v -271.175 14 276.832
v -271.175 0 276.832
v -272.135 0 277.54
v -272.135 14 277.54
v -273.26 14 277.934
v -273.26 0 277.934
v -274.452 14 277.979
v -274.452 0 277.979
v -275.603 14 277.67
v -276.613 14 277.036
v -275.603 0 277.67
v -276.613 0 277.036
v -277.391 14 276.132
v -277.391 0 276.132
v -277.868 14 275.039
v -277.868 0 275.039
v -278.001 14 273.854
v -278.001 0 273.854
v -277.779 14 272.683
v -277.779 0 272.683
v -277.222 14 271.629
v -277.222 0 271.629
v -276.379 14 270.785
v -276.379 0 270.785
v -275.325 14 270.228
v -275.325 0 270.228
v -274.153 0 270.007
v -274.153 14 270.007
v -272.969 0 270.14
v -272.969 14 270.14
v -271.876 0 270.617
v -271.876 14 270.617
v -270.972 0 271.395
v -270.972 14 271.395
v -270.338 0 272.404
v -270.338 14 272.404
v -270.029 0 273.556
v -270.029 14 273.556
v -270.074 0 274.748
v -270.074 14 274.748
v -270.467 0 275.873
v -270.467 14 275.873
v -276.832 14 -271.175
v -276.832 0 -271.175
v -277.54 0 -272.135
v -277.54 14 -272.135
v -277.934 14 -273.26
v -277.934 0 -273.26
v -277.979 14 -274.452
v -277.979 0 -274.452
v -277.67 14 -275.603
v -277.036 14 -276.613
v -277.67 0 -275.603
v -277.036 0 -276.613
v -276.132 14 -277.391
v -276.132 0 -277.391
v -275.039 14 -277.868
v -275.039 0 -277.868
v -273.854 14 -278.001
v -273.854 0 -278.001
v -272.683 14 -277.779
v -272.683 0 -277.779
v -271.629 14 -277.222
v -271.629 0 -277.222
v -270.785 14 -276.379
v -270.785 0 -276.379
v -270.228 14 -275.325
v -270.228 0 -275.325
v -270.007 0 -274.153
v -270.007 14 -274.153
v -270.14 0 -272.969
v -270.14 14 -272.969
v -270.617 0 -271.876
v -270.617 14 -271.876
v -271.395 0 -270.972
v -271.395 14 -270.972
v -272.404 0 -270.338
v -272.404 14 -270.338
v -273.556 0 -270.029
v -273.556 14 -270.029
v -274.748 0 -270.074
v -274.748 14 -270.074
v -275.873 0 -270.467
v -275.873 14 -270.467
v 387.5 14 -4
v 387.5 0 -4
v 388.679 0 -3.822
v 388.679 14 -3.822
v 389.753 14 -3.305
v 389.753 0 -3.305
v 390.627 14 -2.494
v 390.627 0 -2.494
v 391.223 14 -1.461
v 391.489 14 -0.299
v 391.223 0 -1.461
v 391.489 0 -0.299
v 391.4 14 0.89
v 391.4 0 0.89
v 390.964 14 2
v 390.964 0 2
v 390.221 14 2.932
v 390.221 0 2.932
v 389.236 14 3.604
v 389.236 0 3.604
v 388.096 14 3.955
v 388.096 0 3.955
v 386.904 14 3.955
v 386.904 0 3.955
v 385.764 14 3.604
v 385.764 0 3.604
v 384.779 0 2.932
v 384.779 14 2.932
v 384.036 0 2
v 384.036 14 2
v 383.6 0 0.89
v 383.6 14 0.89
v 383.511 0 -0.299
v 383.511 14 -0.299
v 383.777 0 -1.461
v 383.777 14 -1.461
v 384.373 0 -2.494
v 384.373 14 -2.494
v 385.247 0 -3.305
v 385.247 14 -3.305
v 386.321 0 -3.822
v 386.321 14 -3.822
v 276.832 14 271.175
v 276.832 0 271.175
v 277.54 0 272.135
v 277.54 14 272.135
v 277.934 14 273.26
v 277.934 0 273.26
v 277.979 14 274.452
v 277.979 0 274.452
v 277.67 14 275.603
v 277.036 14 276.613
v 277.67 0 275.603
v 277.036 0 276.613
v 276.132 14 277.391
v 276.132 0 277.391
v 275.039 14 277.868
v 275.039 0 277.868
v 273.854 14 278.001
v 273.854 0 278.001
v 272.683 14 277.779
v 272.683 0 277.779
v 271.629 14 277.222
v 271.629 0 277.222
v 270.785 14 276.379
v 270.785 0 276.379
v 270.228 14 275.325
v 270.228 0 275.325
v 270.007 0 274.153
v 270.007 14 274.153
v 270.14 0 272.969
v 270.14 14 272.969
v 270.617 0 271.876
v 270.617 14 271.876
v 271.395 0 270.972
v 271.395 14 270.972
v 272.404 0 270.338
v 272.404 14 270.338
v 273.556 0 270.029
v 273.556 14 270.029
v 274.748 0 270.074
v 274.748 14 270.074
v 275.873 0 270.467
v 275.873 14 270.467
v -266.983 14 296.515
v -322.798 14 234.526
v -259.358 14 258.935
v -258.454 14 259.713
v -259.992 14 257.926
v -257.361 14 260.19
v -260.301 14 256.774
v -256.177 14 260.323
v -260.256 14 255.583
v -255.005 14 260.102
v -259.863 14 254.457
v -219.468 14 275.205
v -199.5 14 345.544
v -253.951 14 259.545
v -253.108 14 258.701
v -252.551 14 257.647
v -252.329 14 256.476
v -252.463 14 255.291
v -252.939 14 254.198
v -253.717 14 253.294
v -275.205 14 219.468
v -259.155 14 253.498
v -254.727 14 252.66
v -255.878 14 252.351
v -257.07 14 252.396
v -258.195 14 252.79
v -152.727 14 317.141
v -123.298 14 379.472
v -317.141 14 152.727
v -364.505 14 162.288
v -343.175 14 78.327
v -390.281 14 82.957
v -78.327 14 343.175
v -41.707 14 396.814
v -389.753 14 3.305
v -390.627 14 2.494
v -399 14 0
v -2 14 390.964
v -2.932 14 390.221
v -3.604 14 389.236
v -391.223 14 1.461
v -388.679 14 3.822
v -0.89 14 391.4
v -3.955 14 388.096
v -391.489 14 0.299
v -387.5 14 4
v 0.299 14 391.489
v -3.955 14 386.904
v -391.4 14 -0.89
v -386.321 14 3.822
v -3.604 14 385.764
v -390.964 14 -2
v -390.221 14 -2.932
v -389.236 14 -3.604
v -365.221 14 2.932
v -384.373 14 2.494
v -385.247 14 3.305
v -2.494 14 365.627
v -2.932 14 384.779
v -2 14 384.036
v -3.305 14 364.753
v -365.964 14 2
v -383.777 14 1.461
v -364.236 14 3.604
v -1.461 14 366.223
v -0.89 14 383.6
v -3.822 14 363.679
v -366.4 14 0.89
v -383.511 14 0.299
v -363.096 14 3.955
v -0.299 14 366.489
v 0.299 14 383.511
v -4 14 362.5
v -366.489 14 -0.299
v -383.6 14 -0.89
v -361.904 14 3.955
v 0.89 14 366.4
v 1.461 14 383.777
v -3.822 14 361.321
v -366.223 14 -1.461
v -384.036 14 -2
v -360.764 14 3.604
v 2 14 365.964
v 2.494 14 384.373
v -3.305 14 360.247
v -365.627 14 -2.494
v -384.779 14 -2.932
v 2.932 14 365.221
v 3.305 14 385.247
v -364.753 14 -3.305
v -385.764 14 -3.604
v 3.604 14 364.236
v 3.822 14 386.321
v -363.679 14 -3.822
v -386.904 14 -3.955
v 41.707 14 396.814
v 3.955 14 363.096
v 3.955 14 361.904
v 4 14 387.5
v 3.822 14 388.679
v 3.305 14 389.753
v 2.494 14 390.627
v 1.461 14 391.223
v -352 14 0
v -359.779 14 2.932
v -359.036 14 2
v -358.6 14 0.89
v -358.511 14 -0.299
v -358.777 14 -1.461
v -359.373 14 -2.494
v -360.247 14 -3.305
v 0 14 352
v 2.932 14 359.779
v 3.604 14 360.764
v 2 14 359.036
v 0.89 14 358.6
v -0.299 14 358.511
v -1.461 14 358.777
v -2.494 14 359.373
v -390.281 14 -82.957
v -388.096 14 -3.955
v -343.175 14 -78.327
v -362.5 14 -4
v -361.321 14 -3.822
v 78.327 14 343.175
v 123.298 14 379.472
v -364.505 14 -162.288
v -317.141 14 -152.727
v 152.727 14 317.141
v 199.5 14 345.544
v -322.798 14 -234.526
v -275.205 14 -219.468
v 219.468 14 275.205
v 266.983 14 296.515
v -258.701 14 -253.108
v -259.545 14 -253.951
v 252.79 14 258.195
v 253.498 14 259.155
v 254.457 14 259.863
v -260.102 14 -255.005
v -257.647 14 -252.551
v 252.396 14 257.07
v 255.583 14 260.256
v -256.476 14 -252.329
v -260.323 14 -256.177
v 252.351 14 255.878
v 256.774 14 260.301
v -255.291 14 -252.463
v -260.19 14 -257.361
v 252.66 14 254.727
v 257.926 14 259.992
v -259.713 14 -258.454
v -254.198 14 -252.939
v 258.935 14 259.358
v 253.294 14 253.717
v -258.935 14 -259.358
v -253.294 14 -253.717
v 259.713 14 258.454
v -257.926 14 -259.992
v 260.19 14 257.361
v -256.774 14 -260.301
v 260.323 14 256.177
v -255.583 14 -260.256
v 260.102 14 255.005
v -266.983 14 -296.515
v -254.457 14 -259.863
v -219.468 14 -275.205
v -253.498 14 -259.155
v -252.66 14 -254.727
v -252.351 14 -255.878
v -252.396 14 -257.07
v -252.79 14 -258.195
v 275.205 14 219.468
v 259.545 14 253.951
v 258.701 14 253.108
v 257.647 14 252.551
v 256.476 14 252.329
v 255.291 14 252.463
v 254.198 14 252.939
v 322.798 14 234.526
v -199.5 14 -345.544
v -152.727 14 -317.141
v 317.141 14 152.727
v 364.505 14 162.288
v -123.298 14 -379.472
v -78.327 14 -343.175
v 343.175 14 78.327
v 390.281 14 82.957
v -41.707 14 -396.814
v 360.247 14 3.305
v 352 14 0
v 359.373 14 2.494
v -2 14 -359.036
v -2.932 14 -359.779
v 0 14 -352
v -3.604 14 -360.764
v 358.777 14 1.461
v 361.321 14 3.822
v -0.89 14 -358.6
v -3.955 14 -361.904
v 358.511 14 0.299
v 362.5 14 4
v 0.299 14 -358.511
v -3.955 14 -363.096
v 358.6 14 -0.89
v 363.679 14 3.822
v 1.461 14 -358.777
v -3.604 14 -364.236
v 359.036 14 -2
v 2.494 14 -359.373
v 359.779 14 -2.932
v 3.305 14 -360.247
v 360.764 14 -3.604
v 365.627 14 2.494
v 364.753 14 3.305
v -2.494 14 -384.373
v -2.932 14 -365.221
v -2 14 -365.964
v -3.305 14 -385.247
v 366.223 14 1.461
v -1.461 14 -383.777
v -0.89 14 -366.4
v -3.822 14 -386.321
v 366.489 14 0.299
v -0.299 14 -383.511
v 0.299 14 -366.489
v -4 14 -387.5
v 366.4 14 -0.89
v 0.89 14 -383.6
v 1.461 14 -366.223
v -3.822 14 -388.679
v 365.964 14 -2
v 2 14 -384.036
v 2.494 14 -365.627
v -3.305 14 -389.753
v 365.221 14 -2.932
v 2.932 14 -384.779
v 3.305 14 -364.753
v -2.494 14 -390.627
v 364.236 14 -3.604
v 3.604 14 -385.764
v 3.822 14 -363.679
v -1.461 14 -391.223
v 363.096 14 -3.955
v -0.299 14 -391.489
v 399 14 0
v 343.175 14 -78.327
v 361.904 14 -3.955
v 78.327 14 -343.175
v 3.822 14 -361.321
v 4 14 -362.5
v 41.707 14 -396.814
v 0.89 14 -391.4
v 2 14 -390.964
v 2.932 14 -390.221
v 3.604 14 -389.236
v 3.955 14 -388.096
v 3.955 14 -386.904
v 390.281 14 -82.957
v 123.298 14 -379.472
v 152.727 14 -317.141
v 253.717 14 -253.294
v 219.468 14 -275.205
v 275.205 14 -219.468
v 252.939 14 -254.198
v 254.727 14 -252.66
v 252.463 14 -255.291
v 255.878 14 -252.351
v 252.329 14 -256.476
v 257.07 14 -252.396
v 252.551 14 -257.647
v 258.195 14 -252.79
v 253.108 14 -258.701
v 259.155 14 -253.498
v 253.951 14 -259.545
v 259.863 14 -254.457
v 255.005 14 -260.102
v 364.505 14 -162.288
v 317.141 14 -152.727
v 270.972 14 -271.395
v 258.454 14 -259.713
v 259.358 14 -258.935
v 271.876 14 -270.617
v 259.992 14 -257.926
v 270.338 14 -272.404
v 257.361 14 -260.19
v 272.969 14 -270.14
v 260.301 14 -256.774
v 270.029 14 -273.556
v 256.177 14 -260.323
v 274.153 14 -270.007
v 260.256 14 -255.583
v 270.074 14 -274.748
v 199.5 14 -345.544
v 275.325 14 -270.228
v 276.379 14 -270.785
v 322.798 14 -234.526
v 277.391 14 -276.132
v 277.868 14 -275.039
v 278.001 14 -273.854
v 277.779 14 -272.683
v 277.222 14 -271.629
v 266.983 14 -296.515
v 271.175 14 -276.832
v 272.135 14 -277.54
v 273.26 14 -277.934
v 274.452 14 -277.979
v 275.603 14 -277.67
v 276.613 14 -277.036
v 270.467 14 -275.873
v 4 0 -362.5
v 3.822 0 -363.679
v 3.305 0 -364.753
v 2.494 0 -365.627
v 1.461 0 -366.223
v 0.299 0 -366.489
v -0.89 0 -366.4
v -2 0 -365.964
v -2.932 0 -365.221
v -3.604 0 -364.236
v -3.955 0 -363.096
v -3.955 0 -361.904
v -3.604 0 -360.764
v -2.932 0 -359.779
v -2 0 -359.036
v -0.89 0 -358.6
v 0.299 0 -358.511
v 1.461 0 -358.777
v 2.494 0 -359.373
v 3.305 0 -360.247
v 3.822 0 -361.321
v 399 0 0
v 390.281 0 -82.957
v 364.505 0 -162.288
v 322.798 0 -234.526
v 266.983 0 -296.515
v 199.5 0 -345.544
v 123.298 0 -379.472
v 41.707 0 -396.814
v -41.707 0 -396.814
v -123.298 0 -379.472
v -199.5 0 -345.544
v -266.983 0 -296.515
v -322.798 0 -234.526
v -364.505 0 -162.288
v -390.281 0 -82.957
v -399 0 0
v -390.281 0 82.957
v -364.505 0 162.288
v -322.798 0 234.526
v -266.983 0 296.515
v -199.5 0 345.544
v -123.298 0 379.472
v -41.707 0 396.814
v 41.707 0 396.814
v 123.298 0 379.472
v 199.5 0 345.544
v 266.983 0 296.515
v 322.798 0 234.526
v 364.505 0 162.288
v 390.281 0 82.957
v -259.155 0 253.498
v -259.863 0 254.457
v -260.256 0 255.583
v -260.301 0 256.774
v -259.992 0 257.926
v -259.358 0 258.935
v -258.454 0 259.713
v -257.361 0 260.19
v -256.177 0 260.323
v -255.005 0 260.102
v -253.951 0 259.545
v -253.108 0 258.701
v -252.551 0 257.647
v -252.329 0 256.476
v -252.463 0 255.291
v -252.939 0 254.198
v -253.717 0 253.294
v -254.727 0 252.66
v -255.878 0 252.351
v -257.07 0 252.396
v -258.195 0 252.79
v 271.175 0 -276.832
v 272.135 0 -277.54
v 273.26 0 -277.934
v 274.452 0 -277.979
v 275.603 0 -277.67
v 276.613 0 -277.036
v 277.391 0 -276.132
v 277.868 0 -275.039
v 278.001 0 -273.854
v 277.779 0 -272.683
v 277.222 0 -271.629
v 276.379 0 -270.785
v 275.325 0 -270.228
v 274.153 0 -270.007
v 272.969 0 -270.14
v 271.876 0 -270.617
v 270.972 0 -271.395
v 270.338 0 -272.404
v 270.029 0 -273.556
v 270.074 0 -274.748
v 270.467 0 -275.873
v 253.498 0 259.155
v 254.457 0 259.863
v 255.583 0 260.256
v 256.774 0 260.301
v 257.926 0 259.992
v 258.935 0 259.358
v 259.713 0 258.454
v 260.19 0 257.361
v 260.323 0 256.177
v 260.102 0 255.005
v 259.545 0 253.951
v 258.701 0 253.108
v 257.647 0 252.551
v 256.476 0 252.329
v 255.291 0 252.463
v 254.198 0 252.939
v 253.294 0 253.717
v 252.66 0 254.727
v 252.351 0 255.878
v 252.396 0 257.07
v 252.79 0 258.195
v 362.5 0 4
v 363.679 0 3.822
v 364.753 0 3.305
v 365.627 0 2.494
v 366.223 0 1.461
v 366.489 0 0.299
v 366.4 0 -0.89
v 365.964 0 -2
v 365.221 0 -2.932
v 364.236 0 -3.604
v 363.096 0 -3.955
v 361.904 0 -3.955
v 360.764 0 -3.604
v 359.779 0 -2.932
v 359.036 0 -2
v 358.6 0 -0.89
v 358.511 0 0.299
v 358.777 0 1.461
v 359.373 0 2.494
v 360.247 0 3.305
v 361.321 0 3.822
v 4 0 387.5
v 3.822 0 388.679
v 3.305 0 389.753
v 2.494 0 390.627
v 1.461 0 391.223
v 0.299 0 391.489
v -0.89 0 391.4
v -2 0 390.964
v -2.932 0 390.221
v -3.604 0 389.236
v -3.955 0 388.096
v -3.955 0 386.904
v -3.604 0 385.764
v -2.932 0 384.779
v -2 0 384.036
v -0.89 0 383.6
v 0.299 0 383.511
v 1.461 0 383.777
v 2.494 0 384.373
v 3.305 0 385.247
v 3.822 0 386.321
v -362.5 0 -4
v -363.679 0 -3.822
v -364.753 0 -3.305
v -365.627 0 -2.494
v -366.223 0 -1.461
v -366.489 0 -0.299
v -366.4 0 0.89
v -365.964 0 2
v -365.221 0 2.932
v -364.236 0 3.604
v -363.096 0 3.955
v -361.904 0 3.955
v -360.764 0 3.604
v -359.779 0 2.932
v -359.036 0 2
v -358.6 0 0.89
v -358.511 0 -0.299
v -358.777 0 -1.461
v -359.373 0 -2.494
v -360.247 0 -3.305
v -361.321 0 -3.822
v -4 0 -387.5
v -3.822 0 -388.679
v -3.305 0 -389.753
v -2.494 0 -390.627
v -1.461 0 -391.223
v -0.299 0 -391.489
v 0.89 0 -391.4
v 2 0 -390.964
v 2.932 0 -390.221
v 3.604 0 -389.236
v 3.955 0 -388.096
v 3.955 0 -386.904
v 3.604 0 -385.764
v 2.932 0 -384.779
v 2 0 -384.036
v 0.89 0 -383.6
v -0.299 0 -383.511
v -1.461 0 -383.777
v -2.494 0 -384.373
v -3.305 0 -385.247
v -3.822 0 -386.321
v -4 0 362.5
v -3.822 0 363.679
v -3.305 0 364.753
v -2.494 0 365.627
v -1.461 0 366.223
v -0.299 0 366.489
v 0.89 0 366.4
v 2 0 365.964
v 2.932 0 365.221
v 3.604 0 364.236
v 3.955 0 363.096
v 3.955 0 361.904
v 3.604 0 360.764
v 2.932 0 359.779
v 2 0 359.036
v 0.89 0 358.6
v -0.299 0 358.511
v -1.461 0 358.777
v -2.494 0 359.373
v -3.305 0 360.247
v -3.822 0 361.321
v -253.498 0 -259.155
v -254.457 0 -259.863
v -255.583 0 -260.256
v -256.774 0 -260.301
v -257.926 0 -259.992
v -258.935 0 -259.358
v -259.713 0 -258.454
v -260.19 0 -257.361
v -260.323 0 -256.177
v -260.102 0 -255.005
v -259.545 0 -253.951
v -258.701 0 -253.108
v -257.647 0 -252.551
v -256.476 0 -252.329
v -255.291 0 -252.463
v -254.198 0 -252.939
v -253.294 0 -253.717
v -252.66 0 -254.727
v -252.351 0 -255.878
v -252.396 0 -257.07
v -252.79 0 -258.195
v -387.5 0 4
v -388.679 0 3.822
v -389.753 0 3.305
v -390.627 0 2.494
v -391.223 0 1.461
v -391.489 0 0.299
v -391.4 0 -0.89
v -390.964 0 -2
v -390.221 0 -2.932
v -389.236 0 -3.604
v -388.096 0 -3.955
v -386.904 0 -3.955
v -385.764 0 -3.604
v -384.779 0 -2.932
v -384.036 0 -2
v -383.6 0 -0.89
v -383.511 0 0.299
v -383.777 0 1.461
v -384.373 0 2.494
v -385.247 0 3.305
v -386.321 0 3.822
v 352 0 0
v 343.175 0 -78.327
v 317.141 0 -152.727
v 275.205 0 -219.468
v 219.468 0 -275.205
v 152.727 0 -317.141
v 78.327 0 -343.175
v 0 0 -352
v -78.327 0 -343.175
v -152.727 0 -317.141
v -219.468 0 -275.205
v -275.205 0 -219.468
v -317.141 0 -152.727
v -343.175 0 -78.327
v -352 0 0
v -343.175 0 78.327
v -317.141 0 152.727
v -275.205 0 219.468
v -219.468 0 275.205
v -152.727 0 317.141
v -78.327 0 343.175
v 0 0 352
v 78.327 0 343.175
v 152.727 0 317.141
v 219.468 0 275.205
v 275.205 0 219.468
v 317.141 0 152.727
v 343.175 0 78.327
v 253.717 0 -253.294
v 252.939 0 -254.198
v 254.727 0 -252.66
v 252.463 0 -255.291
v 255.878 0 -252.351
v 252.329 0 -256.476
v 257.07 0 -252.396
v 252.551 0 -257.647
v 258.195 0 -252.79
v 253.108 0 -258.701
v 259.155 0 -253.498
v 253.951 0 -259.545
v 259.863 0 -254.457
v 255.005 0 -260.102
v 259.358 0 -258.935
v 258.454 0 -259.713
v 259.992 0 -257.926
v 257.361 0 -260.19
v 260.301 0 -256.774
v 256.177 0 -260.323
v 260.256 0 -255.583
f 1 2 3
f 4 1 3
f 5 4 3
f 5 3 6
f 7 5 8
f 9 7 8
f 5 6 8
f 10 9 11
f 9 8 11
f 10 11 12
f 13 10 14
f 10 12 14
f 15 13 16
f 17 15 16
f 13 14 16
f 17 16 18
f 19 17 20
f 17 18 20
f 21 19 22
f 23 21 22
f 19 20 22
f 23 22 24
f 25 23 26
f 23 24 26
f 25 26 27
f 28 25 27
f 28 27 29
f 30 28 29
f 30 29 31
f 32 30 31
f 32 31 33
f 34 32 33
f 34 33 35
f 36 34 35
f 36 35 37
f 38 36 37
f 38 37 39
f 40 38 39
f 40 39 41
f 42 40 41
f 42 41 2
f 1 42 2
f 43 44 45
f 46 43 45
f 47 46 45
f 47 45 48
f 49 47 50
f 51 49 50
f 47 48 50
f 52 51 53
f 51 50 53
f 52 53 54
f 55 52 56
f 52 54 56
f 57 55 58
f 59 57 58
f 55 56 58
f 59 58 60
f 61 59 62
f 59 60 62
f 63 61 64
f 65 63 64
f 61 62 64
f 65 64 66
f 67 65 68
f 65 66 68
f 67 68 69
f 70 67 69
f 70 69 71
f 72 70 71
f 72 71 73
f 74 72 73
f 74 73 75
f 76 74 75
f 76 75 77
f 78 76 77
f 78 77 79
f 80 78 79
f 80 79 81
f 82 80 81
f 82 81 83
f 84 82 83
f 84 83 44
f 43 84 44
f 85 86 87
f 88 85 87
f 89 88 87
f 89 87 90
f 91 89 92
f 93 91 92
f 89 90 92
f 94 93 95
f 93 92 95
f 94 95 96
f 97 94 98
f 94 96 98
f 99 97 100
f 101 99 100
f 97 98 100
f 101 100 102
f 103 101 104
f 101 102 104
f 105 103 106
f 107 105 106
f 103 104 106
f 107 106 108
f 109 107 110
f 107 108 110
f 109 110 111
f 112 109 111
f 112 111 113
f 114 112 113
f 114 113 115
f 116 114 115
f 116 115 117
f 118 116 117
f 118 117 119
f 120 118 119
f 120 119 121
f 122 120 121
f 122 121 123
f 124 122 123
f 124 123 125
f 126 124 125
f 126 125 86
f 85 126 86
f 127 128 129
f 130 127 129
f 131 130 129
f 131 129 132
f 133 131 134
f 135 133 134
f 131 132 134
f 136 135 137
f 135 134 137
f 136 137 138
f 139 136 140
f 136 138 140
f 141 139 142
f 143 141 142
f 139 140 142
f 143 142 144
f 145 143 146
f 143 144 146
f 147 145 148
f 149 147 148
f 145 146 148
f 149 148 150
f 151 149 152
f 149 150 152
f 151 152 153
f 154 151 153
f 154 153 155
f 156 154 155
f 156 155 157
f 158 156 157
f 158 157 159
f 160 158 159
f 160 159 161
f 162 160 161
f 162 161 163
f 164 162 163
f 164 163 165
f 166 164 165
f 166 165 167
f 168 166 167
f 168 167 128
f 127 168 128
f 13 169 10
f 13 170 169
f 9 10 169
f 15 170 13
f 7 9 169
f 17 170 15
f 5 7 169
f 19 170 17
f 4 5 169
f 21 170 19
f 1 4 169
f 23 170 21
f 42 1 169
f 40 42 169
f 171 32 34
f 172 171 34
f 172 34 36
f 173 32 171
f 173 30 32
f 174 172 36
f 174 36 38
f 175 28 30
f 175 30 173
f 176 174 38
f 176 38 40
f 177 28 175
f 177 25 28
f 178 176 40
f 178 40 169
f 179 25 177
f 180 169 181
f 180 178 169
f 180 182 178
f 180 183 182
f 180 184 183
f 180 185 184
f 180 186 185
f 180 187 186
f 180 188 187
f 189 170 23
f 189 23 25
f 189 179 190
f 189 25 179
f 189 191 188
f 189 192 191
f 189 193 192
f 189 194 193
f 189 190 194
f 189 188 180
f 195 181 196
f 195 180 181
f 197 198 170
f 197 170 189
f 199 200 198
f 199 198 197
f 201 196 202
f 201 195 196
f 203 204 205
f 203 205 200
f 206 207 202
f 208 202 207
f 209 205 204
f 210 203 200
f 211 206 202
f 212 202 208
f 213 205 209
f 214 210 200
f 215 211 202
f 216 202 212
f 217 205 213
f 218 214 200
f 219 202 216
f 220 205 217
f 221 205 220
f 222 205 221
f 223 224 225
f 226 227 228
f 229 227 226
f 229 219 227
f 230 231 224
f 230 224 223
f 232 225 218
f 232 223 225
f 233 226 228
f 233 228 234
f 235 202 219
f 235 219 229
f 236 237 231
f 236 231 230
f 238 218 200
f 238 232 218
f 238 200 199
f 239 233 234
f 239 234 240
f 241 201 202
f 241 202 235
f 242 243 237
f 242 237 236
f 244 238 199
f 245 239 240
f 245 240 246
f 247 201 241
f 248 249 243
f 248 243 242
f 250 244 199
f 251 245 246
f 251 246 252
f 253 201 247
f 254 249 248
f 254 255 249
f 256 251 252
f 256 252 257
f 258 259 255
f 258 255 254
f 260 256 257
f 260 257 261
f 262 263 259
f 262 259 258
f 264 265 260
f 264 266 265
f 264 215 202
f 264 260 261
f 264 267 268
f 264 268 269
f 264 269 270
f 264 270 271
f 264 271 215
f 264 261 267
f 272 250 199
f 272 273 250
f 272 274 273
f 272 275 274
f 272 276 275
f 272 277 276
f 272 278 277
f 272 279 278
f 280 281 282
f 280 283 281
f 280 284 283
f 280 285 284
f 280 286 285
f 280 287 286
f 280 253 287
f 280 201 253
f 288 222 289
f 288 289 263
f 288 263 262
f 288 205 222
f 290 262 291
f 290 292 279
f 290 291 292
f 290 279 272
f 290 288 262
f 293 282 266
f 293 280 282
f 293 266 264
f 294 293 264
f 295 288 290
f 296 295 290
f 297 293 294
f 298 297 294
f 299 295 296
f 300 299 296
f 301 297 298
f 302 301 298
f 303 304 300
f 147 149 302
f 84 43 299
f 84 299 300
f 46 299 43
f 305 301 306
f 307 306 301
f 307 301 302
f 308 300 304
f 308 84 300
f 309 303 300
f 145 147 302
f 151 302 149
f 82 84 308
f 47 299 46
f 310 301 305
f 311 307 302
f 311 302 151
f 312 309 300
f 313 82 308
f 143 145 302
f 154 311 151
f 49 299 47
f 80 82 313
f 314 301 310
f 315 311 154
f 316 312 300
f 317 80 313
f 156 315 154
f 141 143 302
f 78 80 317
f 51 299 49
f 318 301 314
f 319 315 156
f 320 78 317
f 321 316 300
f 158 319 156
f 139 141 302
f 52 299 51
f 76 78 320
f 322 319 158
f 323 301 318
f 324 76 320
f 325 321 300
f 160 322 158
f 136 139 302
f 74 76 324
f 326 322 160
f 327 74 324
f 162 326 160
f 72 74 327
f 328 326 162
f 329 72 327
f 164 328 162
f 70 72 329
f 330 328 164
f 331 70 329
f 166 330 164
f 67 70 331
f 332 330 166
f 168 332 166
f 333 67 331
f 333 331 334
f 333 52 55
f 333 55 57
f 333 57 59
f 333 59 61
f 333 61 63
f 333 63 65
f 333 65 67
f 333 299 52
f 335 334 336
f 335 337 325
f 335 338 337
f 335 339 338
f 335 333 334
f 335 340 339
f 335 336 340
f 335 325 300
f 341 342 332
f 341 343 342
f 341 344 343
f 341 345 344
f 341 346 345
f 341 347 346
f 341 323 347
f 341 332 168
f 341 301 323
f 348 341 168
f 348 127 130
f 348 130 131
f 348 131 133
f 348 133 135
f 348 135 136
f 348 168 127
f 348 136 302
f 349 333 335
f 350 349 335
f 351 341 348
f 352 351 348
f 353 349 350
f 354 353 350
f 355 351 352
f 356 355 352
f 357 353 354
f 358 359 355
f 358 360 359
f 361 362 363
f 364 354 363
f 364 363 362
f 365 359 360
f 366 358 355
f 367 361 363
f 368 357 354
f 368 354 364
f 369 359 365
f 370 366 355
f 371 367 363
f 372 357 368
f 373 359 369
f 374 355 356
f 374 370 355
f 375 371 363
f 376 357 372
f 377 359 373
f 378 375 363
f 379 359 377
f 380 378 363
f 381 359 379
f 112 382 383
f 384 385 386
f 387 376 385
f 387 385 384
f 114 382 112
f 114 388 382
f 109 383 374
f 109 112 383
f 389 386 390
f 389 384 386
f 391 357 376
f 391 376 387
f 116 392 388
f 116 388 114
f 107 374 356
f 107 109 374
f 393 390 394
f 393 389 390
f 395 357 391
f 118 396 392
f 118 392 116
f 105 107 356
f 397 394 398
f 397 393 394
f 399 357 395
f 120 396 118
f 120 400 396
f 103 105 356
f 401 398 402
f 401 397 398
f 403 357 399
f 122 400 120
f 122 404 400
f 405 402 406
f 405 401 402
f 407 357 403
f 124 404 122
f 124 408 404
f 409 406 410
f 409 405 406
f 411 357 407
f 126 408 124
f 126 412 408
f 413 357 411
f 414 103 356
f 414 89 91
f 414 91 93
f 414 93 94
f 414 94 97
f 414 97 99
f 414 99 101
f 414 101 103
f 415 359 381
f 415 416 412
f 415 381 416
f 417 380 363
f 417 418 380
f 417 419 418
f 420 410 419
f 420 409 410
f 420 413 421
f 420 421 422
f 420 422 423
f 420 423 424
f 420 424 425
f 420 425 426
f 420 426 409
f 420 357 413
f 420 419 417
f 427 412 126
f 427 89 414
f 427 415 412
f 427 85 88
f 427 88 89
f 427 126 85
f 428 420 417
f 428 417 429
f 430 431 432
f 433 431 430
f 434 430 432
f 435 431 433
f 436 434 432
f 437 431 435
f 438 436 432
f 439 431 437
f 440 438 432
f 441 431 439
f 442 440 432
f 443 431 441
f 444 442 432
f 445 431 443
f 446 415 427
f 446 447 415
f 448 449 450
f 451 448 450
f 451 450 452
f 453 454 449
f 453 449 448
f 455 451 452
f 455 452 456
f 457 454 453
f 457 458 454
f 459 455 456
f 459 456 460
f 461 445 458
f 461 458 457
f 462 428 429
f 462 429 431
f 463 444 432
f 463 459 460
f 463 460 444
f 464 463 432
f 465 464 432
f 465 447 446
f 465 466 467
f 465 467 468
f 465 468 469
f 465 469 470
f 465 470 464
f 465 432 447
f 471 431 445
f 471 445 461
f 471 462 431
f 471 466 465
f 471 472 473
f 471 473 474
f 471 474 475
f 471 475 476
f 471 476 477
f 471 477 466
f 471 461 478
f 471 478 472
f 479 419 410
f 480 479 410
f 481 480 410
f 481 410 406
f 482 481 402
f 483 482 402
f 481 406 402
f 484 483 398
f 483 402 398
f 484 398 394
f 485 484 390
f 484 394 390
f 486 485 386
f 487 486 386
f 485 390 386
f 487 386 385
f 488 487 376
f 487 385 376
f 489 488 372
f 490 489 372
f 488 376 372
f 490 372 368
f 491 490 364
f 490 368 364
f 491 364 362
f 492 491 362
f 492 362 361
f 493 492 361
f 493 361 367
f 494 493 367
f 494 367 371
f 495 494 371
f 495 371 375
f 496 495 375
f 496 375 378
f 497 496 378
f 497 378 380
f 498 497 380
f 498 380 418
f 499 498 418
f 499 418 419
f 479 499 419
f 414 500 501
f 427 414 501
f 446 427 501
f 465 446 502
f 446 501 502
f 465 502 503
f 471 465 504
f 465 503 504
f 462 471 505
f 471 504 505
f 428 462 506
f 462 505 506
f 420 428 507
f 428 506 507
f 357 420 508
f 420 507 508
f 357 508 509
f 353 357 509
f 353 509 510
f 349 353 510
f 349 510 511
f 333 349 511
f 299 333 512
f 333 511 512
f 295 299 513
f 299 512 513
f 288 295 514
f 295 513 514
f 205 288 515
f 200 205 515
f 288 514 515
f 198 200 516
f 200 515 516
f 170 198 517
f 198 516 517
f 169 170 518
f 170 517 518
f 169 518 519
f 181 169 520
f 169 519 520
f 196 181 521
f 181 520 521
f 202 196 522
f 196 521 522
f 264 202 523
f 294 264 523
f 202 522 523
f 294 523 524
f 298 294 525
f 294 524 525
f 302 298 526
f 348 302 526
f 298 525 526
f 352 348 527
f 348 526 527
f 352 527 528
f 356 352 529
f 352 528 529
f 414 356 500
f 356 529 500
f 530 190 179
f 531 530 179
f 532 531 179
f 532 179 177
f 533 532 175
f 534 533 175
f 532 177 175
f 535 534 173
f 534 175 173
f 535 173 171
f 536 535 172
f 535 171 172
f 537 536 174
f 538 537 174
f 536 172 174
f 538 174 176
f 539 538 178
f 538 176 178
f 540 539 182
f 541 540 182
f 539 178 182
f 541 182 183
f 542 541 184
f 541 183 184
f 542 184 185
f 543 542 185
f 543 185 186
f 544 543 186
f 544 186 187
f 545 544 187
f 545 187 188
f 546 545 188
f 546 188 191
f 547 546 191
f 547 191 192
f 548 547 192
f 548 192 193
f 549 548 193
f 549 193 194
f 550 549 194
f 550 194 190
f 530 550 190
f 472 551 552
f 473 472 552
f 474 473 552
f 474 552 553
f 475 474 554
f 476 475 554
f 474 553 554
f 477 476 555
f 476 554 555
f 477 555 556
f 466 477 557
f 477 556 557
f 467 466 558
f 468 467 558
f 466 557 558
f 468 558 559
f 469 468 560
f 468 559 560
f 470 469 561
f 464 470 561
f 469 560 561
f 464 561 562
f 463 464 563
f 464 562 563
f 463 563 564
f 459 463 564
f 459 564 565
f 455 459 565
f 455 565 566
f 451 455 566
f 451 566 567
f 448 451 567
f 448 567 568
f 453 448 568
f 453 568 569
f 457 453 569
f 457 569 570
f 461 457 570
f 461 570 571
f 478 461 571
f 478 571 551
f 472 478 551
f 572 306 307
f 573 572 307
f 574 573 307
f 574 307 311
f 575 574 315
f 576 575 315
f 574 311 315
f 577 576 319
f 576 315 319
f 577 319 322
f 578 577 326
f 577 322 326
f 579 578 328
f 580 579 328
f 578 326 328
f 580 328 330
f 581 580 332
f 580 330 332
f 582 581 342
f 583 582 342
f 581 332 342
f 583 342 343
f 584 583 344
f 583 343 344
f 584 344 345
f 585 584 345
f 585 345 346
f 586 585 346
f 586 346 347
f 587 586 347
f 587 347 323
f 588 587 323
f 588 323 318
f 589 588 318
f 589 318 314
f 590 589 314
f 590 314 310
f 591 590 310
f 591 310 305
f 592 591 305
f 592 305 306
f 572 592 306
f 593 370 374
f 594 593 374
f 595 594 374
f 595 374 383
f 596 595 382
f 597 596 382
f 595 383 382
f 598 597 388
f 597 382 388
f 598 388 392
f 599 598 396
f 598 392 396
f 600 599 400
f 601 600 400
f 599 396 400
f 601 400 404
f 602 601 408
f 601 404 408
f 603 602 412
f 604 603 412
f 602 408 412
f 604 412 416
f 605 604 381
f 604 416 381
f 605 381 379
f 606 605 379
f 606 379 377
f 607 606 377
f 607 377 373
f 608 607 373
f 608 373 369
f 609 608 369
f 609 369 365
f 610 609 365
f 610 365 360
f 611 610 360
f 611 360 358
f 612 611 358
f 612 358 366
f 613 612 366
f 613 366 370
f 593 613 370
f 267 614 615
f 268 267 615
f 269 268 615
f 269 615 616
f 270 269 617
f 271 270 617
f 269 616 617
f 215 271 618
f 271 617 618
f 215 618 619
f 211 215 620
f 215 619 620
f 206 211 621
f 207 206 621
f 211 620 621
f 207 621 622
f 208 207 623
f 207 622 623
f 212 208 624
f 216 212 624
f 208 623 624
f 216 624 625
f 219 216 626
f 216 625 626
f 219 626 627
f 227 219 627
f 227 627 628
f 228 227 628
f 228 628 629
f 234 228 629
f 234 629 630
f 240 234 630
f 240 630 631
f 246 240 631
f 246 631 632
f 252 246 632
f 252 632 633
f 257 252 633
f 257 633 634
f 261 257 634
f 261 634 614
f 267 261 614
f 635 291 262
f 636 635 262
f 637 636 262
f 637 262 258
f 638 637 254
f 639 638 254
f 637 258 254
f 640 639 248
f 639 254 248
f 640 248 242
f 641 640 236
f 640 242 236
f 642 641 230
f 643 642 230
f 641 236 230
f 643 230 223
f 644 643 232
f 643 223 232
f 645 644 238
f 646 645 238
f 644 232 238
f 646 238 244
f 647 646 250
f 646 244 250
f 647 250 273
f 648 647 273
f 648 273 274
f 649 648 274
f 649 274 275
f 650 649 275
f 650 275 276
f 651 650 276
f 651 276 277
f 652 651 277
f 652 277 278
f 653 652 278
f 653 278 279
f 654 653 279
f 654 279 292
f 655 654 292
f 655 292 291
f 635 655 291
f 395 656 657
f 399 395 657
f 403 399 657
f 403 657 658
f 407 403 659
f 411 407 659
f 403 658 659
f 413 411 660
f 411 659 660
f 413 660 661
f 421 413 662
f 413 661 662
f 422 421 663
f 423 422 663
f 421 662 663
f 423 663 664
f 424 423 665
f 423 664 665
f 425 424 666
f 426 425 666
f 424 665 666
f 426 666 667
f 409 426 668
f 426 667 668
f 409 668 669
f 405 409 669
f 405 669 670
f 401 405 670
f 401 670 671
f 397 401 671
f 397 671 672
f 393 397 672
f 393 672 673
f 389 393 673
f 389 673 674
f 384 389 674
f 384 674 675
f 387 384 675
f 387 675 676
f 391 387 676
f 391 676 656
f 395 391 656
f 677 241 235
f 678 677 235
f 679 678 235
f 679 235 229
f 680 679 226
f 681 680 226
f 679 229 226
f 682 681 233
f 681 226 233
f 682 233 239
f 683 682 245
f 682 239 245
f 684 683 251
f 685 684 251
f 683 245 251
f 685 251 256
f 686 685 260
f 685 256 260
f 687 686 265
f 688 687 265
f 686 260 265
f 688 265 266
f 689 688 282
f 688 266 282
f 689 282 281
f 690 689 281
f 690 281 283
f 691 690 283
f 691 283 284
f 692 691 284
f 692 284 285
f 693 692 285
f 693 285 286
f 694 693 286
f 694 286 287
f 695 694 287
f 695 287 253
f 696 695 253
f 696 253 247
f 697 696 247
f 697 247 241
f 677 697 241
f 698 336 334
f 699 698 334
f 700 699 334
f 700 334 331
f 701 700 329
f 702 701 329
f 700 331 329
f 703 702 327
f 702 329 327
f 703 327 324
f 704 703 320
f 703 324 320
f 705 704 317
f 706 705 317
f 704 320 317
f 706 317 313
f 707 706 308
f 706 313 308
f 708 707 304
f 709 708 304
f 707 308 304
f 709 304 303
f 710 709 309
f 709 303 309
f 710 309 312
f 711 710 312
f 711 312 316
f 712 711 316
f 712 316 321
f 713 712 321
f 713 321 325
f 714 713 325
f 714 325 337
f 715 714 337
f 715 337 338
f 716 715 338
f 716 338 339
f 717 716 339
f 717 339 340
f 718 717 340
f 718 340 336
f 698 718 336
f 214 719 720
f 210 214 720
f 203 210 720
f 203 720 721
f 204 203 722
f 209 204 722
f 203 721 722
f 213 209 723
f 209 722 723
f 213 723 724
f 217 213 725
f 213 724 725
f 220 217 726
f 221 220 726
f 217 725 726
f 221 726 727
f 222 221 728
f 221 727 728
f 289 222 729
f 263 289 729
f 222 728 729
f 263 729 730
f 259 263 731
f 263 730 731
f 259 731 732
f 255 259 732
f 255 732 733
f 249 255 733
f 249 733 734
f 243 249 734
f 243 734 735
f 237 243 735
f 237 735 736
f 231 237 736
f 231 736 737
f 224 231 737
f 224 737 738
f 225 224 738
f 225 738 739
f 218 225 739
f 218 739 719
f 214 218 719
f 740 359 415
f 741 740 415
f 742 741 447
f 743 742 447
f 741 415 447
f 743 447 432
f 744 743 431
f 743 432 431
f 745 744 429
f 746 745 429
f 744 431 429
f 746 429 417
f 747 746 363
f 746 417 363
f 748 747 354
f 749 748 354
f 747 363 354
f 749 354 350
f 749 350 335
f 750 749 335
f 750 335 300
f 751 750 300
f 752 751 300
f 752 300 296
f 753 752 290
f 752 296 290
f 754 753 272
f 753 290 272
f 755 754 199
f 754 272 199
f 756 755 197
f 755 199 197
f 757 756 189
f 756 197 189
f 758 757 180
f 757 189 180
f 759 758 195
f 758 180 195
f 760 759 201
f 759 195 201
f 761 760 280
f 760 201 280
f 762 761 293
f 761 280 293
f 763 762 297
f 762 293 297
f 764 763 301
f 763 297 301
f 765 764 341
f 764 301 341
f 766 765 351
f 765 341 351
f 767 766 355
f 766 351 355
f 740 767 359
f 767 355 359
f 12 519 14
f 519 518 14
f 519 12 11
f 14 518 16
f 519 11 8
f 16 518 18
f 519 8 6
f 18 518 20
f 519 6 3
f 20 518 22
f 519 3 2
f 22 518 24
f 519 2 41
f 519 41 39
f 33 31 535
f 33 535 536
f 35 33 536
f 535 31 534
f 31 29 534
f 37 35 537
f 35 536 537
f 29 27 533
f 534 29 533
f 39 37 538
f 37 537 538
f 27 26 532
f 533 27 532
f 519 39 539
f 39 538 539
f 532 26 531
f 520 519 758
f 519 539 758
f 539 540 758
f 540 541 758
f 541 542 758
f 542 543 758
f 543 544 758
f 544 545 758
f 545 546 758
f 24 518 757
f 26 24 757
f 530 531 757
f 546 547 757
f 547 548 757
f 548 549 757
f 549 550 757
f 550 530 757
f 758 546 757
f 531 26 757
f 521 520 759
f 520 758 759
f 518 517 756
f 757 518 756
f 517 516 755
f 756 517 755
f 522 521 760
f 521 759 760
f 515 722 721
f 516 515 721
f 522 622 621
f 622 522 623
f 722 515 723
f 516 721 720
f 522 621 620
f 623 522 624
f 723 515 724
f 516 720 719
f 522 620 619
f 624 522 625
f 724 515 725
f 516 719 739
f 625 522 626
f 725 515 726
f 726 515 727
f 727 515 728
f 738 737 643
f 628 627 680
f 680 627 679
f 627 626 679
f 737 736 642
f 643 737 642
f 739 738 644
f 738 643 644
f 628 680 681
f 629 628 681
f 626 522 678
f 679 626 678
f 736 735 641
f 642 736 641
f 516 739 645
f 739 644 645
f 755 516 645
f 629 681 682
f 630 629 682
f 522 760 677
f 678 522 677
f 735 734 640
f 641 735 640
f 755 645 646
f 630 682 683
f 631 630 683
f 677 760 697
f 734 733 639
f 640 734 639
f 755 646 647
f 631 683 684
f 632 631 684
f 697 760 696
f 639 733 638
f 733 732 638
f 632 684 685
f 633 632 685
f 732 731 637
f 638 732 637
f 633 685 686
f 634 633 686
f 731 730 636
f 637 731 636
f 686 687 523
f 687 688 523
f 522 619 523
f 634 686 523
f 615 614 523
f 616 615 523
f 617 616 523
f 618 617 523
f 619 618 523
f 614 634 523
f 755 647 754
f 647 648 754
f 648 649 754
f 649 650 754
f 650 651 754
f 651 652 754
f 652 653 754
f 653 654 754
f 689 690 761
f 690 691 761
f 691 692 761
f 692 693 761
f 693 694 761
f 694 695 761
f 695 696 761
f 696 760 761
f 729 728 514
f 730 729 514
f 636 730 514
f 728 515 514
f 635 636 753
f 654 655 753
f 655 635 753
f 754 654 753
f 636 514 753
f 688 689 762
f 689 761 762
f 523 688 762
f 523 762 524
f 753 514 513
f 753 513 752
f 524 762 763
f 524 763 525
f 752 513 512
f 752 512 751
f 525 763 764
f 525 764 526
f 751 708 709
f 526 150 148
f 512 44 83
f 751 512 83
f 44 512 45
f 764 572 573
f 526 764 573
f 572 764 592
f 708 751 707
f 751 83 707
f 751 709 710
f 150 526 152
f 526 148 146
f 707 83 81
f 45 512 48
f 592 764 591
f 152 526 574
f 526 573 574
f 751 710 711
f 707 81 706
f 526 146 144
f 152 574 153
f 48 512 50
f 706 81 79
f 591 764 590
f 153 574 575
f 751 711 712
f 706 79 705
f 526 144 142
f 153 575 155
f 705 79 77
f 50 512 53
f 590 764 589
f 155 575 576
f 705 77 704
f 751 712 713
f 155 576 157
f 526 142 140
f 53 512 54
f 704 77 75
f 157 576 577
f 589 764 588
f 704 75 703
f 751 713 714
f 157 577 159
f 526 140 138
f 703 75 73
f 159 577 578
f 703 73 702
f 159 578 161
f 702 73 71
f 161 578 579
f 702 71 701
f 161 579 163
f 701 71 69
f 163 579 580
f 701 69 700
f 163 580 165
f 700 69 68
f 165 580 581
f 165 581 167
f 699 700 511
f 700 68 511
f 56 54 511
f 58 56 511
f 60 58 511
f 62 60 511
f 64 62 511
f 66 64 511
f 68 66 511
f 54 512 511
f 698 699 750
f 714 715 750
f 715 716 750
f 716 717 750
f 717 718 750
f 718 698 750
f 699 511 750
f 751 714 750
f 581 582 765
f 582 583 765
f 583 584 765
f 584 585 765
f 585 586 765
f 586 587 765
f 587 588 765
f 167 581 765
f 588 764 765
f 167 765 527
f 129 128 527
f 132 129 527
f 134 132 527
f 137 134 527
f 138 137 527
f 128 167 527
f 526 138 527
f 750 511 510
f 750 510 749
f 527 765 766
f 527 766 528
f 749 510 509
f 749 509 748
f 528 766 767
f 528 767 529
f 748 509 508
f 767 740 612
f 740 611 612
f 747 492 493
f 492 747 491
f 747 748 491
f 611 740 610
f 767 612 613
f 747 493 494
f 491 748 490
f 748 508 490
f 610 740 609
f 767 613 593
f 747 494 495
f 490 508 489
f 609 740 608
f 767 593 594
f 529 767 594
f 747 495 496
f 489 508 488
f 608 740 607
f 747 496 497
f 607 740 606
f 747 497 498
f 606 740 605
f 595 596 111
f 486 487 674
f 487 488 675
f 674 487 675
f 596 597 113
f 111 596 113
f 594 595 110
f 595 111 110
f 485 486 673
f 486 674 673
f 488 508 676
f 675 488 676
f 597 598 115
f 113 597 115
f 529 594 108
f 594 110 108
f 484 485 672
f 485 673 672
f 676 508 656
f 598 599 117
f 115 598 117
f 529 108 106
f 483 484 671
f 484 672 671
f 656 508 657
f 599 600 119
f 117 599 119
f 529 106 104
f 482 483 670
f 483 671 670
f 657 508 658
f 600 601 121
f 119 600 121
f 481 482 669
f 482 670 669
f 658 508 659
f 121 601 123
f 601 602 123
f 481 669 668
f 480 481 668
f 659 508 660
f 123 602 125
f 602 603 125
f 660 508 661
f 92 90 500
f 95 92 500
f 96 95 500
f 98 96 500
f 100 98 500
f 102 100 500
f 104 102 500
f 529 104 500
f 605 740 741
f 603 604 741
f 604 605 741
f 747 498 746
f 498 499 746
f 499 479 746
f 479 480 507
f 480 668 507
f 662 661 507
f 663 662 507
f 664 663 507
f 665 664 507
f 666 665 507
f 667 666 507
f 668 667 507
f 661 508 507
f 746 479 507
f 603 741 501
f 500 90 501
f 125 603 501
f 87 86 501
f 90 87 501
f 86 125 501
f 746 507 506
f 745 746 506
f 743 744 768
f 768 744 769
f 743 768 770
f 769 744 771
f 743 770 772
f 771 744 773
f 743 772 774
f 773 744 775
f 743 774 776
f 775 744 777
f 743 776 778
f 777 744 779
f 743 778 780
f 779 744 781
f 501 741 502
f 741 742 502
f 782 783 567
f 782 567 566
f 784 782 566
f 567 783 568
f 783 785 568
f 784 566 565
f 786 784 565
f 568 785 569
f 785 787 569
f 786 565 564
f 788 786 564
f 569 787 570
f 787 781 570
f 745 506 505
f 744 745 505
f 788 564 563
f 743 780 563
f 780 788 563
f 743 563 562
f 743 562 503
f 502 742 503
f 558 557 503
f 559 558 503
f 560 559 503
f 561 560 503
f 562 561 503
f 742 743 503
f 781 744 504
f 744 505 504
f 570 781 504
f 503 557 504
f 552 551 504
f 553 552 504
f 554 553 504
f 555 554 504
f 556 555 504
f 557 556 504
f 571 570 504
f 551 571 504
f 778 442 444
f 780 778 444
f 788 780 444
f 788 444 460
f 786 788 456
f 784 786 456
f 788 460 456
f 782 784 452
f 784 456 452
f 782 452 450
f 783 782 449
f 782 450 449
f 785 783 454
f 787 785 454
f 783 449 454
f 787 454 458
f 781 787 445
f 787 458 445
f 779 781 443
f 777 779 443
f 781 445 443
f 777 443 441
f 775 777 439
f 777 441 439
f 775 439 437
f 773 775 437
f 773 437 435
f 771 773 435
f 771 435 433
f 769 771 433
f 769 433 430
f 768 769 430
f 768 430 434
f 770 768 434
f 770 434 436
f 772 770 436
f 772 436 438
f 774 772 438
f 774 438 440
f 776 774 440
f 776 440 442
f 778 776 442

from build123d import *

# Parameters (mm, degrees)
SKETCH1_R           = 399
BOSS_EXTRUDE1_DEPTH = 14
SKETCH2_R           = 352
CUT_EXTRUDE1_DEPTH  = 14
SKETCH4_R           = 4
CUT_EXTRUDE2_DEPTH  = 19.304
CIRPATTERN1_COUNT   = 8
SKETCH7_R           = 4
CUT_EXTRUDE3_DEPTH  = 15
CIRPATTERN2_COUNT   = 8


with BuildPart() as part:
    # Sketch1 → Boss-Extrude1 (new body)
    with BuildSketch(Plane(origin=(0, 0, 0), x_dir=(1, 0, 0), z_dir=(0, 1, 0))):
        Circle(SKETCH1_R)
    extrude(amount=BOSS_EXTRUDE1_DEPTH)

    # Sketch2 → Cut-Extrude1 (cut)
    with BuildSketch(Plane(origin=(0, 14, 0), x_dir=(1, 0, 0), z_dir=(0, 1, 0))):
        Circle(SKETCH2_R)
    extrude(amount=-CUT_EXTRUDE1_DEPTH, mode=Mode.SUBTRACT)

    # Sketch4 → Cut-Extrude2 (cut)
    with BuildSketch(Plane(origin=(0, 0, 0), x_dir=(-1, 0, 0), z_dir=(0, -1, 0))):
        with Locations((0, 387.5)):
            Circle(SKETCH4_R)
    cut_extrude2 = extrude(amount=-CUT_EXTRUDE2_DEPTH, mode=Mode.SUBTRACT)

    # CirPattern1: Cut-Extrude2 ×8 about axis
    cirpattern1_axis = Axis((0, 0, 0), (0, 1, 0))
    for i in range(1, CIRPATTERN1_COUNT):
        add(cut_extrude2.rotate(cirpattern1_axis, i * 360 / CIRPATTERN1_COUNT), mode=Mode.SUBTRACT)

    # Sketch7 → Cut-Extrude3 (cut, through all)
    with BuildSketch(Plane(origin=(0, 14, 0), x_dir=(1, 0, 0), z_dir=(0, 1, 0))):
        with Locations((0, 362.5)):
            Circle(SKETCH7_R)
    cut_extrude3 = extrude(amount=-CUT_EXTRUDE3_DEPTH, mode=Mode.SUBTRACT)

    # CirPattern2: Cut-Extrude3 ×8 about axis
    cirpattern2_axis = Axis((0, 0, 0), (0, 1, 0))
    for i in range(1, CIRPATTERN2_COUNT):
        add(cut_extrude3.rotate(cirpattern2_axis, i * 360 / CIRPATTERN2_COUNT), mode=Mode.SUBTRACT)


solid = part.part
